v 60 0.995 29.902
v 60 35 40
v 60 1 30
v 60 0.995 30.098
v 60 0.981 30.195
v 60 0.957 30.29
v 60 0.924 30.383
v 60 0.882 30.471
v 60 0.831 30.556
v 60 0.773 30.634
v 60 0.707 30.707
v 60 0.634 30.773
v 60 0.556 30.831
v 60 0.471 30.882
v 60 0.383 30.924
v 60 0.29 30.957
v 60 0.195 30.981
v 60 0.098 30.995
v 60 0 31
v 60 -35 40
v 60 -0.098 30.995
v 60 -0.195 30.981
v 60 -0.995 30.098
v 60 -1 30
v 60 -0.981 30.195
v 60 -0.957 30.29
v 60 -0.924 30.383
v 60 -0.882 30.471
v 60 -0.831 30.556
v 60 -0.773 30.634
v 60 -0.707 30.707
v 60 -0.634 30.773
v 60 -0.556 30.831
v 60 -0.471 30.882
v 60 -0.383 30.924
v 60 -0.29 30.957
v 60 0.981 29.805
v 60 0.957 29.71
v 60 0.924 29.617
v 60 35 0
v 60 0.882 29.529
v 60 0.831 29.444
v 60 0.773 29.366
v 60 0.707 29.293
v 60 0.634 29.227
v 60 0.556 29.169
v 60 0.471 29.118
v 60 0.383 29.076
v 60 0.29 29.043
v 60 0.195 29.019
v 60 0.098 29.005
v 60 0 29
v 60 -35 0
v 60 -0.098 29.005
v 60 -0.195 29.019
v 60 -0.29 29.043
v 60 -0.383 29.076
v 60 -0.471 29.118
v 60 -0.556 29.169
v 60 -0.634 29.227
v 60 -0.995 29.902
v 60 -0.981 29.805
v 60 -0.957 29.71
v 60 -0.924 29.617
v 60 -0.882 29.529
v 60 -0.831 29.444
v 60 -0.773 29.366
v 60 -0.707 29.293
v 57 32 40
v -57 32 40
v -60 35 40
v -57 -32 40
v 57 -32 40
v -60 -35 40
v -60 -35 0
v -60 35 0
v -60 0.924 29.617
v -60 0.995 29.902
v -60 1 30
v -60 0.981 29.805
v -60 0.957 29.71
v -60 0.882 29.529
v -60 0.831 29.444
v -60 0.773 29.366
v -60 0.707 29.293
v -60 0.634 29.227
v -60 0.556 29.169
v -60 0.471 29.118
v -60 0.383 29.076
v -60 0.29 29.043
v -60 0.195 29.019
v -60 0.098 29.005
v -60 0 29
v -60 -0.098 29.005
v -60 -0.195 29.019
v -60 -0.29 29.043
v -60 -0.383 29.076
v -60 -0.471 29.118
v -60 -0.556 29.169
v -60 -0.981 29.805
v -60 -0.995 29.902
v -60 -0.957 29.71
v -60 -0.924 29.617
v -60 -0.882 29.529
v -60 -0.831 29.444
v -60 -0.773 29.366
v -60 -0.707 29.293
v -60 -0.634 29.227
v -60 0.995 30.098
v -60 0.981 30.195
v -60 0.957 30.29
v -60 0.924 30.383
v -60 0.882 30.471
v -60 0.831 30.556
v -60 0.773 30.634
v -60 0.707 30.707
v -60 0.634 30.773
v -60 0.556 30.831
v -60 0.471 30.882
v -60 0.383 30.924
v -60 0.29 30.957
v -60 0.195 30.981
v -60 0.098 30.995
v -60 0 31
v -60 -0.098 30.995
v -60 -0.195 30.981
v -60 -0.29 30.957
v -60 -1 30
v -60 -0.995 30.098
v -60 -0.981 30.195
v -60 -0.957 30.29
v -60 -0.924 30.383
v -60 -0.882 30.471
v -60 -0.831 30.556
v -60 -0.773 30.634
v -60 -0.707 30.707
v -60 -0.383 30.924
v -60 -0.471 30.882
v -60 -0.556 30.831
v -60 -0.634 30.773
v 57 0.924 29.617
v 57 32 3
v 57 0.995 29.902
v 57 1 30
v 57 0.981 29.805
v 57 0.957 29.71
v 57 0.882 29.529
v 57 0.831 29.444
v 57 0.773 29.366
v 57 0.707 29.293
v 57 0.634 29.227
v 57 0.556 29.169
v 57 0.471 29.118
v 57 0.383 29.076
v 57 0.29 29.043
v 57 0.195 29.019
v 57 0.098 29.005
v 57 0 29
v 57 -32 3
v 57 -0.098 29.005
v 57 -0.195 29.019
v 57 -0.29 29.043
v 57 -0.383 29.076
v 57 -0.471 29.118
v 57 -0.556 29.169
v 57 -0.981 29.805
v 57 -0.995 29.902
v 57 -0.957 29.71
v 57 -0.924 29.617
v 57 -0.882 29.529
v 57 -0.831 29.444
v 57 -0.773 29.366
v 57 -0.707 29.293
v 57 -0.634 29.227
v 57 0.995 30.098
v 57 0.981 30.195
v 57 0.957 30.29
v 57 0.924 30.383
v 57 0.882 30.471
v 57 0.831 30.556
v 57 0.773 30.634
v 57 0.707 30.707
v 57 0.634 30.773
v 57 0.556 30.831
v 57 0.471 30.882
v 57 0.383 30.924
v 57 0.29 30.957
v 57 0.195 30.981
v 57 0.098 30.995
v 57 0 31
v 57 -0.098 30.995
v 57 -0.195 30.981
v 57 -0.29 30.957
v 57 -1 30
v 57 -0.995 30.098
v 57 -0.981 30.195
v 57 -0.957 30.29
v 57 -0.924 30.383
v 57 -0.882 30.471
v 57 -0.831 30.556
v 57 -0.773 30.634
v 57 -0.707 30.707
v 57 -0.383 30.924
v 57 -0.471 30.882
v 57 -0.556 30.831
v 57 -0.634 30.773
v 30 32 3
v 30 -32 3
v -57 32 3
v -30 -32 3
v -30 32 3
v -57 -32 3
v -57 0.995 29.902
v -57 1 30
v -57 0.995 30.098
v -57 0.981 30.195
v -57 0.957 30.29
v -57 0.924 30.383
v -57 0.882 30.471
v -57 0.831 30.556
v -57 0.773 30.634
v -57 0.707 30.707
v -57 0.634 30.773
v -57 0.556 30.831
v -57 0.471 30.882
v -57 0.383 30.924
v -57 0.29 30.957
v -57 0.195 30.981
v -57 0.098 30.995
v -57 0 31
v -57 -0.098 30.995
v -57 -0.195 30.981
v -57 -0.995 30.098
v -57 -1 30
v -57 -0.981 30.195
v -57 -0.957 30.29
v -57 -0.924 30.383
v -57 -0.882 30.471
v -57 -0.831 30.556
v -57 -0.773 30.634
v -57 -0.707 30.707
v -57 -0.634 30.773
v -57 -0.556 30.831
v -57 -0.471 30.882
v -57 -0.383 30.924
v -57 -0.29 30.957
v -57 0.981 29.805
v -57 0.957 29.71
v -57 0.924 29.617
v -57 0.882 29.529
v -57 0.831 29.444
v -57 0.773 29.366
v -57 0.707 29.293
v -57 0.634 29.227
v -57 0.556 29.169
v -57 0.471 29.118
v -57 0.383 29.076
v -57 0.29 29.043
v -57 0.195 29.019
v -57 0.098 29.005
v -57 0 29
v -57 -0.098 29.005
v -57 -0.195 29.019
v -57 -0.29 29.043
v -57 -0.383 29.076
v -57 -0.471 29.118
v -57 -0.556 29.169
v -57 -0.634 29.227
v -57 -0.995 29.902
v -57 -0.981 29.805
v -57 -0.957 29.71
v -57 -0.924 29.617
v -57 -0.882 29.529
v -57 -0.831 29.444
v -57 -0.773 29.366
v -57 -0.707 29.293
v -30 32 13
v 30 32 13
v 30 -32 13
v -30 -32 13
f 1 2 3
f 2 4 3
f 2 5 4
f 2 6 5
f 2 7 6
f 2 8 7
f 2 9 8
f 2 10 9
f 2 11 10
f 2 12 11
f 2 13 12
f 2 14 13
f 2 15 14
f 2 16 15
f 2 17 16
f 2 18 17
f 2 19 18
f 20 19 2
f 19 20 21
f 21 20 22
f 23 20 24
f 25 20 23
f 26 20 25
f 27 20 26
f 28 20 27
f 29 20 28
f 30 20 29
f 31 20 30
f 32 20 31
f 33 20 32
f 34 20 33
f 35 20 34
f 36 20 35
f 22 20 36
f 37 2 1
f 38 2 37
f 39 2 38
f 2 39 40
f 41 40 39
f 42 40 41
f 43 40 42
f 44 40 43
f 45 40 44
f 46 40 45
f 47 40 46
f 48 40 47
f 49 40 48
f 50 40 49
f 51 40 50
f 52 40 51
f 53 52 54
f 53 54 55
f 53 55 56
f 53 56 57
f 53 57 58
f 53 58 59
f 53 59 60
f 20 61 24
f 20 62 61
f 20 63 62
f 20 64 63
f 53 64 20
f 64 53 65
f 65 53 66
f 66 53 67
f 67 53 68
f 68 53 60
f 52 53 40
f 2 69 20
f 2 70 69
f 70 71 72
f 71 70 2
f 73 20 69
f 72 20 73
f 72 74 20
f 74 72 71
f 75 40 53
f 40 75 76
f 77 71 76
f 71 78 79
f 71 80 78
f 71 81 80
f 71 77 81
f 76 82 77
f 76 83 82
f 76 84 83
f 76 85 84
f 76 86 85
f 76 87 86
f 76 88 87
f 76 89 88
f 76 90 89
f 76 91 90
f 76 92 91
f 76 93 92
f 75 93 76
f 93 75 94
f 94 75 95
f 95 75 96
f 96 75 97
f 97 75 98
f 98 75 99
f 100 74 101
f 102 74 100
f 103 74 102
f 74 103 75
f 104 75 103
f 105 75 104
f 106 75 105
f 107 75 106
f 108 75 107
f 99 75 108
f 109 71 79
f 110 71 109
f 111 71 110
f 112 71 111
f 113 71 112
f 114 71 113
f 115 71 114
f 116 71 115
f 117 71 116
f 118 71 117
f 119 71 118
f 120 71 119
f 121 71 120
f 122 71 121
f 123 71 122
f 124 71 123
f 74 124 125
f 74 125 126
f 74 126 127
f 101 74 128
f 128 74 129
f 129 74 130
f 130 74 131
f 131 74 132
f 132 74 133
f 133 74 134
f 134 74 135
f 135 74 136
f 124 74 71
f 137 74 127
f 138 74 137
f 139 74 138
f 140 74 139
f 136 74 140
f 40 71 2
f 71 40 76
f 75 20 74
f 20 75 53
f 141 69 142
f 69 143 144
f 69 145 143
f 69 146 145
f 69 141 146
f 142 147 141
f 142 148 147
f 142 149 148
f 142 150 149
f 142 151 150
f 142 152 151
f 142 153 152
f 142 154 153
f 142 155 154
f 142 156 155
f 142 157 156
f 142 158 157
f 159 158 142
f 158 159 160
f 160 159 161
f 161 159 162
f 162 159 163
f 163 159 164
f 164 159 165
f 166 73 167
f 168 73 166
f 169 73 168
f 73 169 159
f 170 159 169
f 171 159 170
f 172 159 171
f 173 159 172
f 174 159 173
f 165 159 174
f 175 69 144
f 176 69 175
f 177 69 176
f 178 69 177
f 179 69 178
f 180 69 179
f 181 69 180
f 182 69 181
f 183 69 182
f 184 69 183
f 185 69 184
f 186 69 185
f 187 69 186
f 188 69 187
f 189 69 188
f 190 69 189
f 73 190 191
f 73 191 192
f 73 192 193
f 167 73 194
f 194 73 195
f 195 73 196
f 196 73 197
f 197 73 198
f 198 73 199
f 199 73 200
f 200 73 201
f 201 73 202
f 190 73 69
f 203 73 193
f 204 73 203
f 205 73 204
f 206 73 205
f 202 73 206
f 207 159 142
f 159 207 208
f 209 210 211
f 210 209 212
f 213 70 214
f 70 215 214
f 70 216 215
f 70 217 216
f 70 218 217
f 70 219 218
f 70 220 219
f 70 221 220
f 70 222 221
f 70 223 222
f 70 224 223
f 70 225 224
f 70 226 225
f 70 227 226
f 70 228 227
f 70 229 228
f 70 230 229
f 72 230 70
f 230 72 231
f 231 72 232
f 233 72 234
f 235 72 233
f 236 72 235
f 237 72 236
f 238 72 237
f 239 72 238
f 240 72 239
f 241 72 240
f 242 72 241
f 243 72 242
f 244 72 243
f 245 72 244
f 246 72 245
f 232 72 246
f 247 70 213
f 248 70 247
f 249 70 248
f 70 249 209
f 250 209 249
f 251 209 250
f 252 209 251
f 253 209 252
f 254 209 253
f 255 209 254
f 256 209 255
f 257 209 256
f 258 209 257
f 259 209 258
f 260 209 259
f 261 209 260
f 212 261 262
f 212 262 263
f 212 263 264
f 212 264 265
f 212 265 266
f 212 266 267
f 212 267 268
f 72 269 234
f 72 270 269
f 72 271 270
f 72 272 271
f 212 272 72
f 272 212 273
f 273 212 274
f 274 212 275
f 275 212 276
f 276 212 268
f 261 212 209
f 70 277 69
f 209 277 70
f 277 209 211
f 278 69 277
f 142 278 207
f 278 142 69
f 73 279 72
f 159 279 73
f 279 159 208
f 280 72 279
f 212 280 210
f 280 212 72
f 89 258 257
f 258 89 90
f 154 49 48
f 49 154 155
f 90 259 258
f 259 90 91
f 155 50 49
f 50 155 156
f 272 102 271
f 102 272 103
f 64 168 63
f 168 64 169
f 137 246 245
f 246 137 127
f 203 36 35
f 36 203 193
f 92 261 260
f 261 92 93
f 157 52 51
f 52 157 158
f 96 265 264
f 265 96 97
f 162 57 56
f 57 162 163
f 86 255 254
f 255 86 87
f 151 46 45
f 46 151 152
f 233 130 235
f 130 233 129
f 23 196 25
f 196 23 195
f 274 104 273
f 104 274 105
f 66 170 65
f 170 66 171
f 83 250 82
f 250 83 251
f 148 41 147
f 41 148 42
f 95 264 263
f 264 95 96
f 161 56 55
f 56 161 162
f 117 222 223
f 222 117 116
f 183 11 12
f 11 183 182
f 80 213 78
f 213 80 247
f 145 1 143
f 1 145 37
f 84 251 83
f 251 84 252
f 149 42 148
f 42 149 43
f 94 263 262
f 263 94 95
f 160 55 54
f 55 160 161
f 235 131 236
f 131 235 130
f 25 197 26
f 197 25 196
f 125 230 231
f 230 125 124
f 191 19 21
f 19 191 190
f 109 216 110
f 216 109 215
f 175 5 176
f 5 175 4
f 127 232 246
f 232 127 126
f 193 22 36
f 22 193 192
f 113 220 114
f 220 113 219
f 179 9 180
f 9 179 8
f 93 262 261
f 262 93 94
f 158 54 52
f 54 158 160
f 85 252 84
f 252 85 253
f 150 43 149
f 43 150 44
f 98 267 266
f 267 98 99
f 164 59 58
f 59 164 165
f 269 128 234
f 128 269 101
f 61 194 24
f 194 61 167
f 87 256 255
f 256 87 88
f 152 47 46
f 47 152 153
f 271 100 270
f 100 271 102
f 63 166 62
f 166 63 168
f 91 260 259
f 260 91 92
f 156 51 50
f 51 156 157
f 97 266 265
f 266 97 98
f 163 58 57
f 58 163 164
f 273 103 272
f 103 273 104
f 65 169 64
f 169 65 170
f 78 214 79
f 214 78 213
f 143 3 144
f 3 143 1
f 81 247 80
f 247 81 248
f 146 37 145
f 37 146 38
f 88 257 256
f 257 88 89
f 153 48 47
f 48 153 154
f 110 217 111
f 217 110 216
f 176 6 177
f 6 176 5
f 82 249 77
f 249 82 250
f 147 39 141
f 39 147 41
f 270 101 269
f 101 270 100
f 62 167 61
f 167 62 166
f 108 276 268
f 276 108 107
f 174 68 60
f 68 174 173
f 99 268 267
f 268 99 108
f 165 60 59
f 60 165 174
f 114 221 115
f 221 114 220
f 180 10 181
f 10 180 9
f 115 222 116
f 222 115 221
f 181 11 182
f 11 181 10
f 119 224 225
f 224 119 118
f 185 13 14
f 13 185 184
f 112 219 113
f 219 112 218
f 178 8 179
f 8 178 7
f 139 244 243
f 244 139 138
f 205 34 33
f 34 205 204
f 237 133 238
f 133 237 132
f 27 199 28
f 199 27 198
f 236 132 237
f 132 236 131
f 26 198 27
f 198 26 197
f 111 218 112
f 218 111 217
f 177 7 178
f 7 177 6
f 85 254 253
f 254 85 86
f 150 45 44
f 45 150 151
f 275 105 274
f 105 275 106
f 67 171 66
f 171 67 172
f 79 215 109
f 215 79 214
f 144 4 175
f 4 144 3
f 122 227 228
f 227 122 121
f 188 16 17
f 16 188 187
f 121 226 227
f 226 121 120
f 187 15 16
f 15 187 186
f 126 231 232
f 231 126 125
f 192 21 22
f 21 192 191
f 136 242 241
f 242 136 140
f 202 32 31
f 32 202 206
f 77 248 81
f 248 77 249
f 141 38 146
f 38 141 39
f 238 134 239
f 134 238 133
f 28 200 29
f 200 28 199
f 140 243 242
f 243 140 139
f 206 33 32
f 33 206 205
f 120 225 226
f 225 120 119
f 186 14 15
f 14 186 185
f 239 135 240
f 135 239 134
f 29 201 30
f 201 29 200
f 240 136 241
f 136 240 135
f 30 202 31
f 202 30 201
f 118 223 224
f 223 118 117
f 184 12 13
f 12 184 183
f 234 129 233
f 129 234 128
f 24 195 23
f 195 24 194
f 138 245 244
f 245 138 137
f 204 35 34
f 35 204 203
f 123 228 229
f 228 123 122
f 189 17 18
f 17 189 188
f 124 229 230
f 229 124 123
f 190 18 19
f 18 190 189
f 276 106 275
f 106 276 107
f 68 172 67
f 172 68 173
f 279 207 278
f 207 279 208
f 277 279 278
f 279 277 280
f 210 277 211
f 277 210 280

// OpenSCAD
// Buffer tank for mini horizontal gel-electrophoresis box
// Dimensions measured with calipers

// Outer dimensions
outer_x = 120;
outer_y = 70;
outer_z = 40;

// Wall and floor thickness
wall_thickness = 3;
floor_thickness = 3;

// Inner dimensions (derived)
inner_x = outer_x - 2 * wall_thickness;
inner_y = outer_y - 2 * wall_thickness;
inner_z = outer_z - floor_thickness;

// Gel tray platform dimensions
platform_x = 60;
platform_y = inner_y; // spans full inner width
platform_z = 10; // height above inner floor
platform_z_top = floor_thickness + platform_z; // absolute Z position of top surface

// Electrode wire holes
hole_diameter = 2;
hole_y = 0;
hole_z = 30;

// Rendering quality
$fn = 64;

// Main tank body (outer shell minus inner cavity)
difference() {
    // Outer block
    translate([-outer_x/2, -outer_y/2, 0])
        cube([outer_x, outer_y, outer_z]);
    
    // Inner cavity (open top)
    // Cut from z = floor_thickness up to z = outer_z + 1 (extend past top)
    translate([-inner_x/2, -inner_y/2, floor_thickness])
        cube([inner_x, inner_y, outer_z - floor_thickness + 1]);
    
    // Electrode wire holes through end walls
    // Left end wall (X = -outer_x/2)
    translate([-outer_x/2, hole_y, hole_z])
        rotate([0, 90, 0])
        cylinder(h = outer_x + 2, r = hole_diameter/2, $fn = 64);

    // Right end wall (X = +outer_x/2)
    translate([outer_x/2, hole_y, hole_z])
        rotate([0, 90, 0])
        cylinder(h = outer_x + 2, r = hole_diameter/2, $fn = 64);
}

// Gel tray platform (solid raised platform in the middle)
// Positioned at center X, spanning full inner Y, from z = floor_thickness to z = platform_z_top
translate([-platform_x/2, -platform_y/2, floor_thickness])
    cube([platform_x, platform_y, platform_z]);
